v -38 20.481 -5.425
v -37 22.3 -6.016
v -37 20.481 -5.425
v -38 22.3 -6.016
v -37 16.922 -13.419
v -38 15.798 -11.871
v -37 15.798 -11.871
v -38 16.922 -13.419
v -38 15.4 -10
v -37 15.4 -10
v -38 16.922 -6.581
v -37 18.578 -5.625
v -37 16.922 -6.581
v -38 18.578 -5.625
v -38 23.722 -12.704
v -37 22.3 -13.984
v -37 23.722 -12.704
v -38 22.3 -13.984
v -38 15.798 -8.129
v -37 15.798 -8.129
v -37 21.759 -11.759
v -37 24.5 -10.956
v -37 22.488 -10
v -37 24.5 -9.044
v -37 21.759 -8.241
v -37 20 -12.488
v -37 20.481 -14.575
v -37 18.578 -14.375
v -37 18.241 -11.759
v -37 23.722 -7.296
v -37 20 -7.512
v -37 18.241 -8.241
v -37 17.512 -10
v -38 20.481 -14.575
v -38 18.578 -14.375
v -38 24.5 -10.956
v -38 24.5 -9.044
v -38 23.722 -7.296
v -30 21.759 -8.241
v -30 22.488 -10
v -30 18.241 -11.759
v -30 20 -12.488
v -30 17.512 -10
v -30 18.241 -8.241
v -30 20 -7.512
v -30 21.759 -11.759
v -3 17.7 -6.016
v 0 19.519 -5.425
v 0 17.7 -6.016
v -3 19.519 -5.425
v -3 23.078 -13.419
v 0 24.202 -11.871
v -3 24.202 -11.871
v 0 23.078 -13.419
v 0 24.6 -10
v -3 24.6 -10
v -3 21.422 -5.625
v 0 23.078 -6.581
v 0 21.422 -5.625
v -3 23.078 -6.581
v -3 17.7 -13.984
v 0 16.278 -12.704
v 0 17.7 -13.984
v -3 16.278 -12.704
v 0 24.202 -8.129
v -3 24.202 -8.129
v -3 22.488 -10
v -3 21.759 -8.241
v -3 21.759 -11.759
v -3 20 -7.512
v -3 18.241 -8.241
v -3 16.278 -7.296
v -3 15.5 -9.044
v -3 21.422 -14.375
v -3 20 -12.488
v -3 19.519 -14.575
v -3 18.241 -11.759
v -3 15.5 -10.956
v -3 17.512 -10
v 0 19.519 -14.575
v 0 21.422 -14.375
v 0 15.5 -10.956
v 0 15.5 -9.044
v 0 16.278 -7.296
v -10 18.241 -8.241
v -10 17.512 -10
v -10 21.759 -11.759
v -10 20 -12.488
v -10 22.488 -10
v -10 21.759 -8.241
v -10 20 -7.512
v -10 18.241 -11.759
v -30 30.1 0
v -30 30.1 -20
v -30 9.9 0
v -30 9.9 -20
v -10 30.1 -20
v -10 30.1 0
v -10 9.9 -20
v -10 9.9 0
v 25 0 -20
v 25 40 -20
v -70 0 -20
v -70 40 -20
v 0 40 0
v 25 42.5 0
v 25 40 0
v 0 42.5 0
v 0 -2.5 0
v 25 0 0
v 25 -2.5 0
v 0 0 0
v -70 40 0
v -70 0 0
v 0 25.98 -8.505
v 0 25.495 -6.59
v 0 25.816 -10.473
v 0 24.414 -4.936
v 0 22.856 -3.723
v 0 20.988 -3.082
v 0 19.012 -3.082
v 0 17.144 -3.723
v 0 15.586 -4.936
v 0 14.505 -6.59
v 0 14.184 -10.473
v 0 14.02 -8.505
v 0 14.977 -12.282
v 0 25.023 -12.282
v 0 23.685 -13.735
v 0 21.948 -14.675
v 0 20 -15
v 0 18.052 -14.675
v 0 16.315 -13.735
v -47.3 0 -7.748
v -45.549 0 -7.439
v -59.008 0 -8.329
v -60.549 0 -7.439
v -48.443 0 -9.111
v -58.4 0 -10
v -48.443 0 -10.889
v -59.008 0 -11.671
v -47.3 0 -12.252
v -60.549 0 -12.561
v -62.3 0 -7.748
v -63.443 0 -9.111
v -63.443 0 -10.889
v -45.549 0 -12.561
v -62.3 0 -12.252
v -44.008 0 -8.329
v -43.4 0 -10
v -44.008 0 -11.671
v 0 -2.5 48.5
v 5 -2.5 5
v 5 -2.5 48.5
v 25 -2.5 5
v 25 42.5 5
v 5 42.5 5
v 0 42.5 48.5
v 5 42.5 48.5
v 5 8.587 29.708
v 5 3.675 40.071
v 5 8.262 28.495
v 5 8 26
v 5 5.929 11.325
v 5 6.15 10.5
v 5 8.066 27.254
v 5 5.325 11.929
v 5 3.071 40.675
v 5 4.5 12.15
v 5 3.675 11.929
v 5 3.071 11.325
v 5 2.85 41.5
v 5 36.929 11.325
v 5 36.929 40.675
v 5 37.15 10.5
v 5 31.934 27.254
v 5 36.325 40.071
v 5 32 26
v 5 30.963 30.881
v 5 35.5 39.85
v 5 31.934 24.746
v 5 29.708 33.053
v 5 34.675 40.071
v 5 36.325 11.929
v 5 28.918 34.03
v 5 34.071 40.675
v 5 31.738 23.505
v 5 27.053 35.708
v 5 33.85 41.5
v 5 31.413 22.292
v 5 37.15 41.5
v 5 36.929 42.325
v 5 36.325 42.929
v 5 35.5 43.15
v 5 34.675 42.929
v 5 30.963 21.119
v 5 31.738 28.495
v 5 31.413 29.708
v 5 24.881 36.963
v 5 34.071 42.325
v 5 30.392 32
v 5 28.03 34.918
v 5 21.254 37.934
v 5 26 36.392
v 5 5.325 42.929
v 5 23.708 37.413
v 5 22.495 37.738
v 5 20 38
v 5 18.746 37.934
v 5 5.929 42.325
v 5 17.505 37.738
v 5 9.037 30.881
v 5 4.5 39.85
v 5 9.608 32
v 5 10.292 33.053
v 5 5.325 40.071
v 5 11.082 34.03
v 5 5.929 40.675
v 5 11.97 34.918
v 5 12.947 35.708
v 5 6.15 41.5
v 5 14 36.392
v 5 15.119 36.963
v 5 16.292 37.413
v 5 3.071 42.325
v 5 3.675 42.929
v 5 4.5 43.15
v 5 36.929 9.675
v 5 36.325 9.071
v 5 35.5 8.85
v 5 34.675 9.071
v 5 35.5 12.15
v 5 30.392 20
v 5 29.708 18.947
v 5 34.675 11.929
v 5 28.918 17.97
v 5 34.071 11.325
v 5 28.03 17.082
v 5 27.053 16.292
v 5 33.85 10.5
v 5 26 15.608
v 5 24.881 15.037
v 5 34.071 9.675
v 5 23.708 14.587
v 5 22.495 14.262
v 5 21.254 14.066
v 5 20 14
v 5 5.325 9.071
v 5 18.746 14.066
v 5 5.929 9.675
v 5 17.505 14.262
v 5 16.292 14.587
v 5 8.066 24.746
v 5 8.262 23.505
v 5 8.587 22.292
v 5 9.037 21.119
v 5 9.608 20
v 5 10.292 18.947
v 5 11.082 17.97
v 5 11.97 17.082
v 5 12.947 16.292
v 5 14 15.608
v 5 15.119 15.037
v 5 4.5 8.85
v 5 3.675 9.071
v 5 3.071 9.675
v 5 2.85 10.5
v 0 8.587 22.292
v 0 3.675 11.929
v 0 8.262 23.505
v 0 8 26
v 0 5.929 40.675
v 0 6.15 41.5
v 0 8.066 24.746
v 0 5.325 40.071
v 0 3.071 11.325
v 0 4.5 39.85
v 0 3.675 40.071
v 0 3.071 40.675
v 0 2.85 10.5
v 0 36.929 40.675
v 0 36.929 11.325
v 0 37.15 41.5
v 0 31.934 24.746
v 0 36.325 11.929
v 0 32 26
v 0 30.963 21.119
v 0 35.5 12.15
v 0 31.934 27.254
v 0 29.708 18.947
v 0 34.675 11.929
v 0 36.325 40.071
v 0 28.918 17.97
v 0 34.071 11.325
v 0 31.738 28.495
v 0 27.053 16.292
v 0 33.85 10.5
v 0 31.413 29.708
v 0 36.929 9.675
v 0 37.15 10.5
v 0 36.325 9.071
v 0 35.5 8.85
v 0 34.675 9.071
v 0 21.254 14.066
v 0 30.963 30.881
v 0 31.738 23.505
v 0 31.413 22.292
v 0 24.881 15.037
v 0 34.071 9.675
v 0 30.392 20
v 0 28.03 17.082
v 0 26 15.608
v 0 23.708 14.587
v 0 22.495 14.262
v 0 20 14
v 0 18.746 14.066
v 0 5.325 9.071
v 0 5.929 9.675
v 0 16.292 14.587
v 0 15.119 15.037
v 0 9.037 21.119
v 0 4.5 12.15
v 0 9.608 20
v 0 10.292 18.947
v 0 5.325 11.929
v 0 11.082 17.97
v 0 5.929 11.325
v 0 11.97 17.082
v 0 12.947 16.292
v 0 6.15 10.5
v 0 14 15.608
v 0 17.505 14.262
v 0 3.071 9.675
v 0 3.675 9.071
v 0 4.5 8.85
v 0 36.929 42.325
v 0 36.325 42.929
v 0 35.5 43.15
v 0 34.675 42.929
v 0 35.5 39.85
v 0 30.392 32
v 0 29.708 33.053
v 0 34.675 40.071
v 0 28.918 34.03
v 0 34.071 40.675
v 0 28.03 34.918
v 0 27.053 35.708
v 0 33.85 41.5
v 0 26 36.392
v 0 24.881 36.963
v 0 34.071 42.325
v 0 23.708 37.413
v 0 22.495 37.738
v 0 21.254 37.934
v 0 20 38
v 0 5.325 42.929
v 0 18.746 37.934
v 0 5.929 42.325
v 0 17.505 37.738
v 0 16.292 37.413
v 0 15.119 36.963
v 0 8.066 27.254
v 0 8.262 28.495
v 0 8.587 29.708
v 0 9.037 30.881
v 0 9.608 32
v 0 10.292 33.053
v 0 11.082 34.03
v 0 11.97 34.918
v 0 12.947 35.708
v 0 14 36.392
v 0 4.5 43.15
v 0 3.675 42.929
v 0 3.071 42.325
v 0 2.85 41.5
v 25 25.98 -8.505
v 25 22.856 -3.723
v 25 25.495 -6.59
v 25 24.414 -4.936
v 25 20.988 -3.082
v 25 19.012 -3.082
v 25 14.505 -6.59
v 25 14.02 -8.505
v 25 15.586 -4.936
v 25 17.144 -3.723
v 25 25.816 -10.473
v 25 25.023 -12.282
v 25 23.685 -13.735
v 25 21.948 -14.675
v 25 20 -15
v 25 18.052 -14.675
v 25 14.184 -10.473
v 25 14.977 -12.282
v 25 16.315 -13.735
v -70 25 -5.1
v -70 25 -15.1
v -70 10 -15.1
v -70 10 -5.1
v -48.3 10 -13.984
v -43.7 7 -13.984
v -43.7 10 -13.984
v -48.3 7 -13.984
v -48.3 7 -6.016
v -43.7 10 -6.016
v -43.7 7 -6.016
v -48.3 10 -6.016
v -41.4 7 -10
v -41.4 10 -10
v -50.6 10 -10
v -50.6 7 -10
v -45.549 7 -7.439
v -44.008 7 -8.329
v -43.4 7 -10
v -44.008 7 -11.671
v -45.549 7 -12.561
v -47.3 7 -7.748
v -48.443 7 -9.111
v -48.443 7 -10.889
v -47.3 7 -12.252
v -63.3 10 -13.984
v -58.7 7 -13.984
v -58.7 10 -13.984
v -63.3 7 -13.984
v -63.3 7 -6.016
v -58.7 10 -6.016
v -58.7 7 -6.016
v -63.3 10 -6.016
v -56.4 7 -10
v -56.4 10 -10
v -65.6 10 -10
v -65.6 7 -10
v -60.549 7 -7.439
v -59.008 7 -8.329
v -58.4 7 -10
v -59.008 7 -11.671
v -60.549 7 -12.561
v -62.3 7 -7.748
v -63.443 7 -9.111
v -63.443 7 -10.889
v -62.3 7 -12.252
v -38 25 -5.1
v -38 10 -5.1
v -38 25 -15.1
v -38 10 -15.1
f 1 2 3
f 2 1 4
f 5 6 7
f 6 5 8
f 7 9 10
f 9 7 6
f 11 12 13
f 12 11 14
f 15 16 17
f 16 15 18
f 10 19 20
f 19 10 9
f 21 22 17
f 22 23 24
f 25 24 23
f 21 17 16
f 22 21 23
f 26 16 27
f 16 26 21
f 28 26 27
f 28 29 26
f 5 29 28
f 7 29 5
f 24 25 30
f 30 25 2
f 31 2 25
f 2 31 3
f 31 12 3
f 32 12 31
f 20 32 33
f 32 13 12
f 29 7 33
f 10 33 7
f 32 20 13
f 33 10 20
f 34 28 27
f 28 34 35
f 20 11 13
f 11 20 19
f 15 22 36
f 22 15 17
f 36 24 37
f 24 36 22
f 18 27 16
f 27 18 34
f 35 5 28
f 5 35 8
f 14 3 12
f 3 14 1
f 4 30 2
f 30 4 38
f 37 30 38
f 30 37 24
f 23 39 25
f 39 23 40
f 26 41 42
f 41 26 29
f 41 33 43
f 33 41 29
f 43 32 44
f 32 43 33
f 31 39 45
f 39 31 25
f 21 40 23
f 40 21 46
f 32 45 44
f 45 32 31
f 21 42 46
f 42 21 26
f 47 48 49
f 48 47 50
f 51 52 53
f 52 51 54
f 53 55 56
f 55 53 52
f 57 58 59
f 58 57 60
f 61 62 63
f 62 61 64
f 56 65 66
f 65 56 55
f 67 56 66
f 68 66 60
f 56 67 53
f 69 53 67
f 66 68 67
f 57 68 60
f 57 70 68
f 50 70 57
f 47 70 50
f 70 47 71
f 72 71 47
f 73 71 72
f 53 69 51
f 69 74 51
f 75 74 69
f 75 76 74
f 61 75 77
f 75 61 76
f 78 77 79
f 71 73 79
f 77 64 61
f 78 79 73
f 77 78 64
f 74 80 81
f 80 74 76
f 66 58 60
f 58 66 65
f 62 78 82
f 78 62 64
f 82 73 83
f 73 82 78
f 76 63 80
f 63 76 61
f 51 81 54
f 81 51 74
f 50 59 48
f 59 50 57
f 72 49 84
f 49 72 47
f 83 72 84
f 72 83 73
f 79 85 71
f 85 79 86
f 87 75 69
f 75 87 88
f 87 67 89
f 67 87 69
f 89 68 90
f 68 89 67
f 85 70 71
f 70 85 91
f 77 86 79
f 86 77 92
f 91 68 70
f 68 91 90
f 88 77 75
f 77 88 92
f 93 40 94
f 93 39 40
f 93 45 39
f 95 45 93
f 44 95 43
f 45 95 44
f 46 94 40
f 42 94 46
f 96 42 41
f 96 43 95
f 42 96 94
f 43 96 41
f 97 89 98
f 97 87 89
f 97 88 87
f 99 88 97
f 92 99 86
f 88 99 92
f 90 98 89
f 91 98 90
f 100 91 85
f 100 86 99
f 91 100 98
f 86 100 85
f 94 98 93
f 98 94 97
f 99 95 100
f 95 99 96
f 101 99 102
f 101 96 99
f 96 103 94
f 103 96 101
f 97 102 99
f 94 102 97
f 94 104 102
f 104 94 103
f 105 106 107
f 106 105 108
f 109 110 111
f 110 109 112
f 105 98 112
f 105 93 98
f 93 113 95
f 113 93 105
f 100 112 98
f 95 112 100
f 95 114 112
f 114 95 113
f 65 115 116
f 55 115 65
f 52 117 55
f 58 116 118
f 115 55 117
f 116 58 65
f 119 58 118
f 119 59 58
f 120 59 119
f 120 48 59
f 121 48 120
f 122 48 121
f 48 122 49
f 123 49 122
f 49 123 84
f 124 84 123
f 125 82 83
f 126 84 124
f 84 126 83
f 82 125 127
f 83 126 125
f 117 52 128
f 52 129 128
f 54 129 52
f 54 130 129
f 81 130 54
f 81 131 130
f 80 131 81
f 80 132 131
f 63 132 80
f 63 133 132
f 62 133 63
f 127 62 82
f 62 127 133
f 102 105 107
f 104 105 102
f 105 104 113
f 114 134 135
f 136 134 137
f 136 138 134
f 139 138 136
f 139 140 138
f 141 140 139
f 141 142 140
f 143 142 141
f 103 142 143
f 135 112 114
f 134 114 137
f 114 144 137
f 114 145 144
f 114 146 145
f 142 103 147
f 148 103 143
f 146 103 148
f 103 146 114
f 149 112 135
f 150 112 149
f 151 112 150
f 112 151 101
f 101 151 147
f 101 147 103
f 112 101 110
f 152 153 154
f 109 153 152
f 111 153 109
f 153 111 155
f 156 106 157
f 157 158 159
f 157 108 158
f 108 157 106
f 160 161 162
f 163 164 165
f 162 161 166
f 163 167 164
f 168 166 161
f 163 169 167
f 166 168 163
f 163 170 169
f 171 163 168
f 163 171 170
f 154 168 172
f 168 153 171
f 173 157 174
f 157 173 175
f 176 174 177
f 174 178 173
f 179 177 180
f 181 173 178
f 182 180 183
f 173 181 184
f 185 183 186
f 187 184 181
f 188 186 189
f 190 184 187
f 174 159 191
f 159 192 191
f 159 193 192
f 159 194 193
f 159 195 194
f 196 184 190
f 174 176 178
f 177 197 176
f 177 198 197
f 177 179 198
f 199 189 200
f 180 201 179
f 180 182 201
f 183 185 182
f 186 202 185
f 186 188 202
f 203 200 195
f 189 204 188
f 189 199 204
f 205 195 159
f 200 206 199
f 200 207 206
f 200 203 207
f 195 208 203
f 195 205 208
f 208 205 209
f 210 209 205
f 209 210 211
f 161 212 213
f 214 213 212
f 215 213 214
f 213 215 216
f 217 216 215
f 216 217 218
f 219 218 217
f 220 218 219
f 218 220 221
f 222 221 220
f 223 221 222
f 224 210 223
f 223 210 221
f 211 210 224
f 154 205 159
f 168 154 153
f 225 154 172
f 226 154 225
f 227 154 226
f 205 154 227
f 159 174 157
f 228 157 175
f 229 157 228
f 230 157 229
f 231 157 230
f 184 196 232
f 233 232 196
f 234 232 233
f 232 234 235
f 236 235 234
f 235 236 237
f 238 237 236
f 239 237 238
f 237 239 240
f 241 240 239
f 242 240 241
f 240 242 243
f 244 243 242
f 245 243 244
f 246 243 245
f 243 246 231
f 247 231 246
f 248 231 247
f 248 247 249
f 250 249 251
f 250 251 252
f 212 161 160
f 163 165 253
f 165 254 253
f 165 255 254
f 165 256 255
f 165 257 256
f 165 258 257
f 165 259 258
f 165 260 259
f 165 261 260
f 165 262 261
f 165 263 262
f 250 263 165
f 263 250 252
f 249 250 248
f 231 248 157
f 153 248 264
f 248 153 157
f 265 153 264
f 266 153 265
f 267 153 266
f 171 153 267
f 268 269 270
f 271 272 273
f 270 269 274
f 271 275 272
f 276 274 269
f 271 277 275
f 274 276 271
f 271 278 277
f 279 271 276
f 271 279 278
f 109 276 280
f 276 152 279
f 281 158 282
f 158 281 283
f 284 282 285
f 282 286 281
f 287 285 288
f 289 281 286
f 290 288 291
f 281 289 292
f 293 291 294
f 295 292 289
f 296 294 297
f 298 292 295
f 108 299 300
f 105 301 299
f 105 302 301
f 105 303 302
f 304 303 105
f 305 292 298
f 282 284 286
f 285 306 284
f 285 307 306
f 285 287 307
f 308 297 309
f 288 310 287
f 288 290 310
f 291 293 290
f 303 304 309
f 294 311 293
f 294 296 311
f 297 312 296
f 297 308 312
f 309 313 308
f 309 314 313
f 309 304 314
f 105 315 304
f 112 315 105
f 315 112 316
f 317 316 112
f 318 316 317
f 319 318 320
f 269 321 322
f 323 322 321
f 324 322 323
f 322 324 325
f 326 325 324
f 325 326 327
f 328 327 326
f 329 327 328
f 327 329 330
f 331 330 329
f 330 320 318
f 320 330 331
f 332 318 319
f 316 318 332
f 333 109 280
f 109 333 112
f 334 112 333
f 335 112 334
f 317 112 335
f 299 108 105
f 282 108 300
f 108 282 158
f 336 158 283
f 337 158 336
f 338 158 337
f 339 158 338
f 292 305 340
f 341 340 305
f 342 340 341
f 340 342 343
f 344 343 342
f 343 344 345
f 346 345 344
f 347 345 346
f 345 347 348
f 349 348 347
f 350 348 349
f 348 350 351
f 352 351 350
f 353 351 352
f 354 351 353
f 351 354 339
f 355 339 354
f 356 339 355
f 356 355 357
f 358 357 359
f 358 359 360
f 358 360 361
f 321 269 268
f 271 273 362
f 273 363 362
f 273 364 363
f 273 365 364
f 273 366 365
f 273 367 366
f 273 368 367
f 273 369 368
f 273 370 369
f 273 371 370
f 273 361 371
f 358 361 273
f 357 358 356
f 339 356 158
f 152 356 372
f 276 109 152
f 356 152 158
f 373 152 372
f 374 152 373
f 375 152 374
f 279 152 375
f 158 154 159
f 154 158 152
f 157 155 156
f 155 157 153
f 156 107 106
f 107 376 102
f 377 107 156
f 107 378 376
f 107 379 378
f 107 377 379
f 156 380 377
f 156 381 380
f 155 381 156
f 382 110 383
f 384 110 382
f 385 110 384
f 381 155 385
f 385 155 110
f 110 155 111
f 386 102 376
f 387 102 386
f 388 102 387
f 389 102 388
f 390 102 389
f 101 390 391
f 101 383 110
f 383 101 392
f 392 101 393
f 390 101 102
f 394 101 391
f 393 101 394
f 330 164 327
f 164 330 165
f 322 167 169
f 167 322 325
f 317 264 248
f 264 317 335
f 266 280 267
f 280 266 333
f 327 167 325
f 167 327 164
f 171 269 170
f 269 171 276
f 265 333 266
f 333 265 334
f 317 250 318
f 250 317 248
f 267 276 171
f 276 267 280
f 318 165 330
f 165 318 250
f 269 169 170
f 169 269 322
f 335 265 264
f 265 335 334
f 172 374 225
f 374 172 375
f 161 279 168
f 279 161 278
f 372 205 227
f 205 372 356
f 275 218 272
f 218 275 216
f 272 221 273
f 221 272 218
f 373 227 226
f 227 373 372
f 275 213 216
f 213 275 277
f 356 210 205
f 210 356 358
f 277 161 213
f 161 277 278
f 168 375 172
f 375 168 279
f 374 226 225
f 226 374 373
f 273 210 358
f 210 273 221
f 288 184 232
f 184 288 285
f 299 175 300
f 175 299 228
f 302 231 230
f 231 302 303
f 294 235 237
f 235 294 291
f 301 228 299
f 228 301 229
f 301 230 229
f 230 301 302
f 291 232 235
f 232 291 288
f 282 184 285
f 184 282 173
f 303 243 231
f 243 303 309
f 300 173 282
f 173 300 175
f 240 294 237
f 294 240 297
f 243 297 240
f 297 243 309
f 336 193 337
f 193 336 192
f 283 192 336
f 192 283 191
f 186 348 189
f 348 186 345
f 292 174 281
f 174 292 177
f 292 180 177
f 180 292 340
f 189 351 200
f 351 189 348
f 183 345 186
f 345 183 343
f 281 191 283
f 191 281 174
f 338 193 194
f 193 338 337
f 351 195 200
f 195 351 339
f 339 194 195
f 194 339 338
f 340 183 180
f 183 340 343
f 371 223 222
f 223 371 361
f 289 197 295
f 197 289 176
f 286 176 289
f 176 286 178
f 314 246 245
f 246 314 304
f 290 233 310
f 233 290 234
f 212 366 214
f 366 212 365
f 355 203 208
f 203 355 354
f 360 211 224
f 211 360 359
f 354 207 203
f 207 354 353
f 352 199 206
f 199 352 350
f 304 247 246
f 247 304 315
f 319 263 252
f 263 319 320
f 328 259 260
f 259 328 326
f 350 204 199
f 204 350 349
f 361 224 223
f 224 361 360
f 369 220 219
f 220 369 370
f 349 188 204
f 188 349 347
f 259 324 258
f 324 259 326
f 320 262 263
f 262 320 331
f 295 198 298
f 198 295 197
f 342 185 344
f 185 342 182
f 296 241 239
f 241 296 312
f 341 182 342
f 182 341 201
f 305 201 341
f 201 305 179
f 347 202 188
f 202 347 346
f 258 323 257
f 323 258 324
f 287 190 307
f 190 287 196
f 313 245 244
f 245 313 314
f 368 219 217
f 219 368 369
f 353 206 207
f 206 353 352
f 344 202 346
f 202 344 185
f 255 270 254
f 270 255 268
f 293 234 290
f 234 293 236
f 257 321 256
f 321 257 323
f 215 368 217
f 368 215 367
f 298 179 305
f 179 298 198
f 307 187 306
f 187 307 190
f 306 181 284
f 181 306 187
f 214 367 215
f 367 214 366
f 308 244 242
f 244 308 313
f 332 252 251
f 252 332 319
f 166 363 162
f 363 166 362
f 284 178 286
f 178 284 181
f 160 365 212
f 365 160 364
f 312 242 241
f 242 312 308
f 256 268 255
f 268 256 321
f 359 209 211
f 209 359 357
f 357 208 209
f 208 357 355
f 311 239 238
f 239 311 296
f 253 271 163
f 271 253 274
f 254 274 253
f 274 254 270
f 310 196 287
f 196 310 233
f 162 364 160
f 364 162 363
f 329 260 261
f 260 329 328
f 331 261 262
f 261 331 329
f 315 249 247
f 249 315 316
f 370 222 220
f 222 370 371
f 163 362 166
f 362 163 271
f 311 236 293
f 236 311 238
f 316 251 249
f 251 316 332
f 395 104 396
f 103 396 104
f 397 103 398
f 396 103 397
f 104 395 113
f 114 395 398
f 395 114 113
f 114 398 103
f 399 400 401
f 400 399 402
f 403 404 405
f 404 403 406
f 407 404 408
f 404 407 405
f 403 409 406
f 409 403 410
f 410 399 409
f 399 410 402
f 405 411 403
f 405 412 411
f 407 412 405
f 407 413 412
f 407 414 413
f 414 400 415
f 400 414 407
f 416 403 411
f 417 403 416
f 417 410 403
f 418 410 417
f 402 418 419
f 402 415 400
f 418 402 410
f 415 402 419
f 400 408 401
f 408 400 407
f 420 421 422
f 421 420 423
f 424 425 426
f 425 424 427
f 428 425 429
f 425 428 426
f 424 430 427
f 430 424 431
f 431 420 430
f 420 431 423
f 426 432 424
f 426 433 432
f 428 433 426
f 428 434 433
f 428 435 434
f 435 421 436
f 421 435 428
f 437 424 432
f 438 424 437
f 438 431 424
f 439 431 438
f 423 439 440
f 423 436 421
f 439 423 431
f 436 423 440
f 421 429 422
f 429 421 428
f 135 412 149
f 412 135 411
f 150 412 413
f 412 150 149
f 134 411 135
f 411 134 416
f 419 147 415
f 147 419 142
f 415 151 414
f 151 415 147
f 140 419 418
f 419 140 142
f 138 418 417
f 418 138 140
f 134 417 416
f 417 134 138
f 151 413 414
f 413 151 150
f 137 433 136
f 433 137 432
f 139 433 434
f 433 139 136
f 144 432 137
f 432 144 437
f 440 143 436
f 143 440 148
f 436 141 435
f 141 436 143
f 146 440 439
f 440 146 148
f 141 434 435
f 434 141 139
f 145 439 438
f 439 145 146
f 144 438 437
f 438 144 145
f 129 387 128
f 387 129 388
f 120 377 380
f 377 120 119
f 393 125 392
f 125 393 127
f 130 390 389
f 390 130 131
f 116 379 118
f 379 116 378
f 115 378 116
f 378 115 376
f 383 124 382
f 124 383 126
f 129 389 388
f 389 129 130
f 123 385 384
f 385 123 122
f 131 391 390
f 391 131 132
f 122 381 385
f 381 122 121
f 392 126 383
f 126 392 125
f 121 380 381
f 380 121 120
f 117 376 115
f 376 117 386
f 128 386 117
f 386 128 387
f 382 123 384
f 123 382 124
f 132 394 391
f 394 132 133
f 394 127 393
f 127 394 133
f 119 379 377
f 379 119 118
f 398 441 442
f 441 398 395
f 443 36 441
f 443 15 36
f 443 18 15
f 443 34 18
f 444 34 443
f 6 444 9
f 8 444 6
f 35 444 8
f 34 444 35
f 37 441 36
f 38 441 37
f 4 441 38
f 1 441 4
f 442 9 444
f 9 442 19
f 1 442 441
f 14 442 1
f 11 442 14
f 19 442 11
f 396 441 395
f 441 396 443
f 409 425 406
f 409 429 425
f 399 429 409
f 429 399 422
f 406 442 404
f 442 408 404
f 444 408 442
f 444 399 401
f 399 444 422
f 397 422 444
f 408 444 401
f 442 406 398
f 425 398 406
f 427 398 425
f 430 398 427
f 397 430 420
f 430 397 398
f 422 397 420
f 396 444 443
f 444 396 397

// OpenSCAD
// file: MCAD/constants.scad
// MIT license


TAU = 6.2831853071; //2*PI, see http://tauday.com/
PI = TAU/2;

// translates a imperial measurement in inches to meters
mm_per_inch = 25.4;
// file: MCAD/math.scad
// MIT license

include <constants.scad>

function deg(angle) = 360*angle/TAU;
// file: bom.scad
module bom(code, desc, category) {
	echo(str("BOM: ",code," - ", desc, "; ", category));
}
// file: MCAD/shapes.scad
/*
 *  OpenSCAD Shapes Library (www.openscad.org)
 *  Copyright (C) 2009  Catarina Mota
 *  Copyright (C) 2010  Elmo Mäntynen
 *
 *  License: LGPL 2.1 or later
*/

// 2D Shapes
//ngon(sides, radius, center=false);

// 3D Shapes
//box(width, height, depth);
//roundedBox(width, height, depth, factor);
//cone(height, radius);
//ellipticalCylinder(width, height, depth);
//ellipsoid(width, height);
//tube(height, radius, wall, center = false);
//tube2(height, ID, OD, center = false);
//ovalTube(width, height, depth, wall, center = false);
//hexagon(height, depth);
//octagon(height, depth);
//dodecagon(height, depth);
//hexagram(height, depth);
//rightTriangle(adjacent, opposite, depth);
//equiTriangle(side, depth);
//12ptStar(height, depth);

//----------------------

// size is a vector [w, h, d]
module box(width, height, depth) {
  cube([width, height, depth], true);
}

// size is a vector [w, h, d]
module roundedBox(width, height, depth, radius) {
  size=[width, height, depth];
  cube(size - [2*radius,0,0], true);
  cube(size - [0,2*radius,0], true);
  for (x = [radius-size[0]/2, -radius+size[0]/2],
       y = [radius-size[1]/2, -radius+size[1]/2]) {
    translate([x,y,0]) cylinder(r=radius, h=size[2], center=true);
  }
}

module cone(height, radius, center = false) {
  cylinder(height, radius, 0, center);
}

module ellipticalCylinder(w,h, height, center = false) {
  scale([1, h/w, 1]) cylinder(h=height, r=w, center=center);
}

module ellipsoid(w, h, center = false) {
  scale([1, h/w, 1]) sphere(r=w/2, center=center);
}

// wall is wall thickness
module tube(height, radius, wall, center = false) {
  difference() {
    cylinder(h=height, r=radius, center=center);
    cylinder(h=height, r=radius-wall, center=center);
  }
}

// wall is wall thickness
module tube2(height, ID, OD, center = false) {
  difference() {
    cylinder(h=height, r=OD/2, center=center);
    cylinder(h=height, r=ID/2, center=center);
  }
}

// wall is wall thickness
module ovalTube(height, rx, ry, wall, center = false) {
  difference() {
    scale([1, ry/rx, 1]) cylinder(h=height, r=rx, center=center);
    scale([(rx-wall)/rx, (ry-wall)/rx, 1]) cylinder(h=height, r=rx, center=center);
  }
}

// size is the XY plane size, height in Z
module hexagon(size, height) {
  boxWidth = size/1.75;
  for (r = [-60, 0, 60]) rotate([0,0,r]) cube([boxWidth, size, height], true);
}

// size is the XY plane size, height in Z
module octagon(size, height) {
  intersection() {
    cube([size, size, height], true);
    rotate([0,0,45]) cube([size, size, height], true);
  }
}

// size is the XY plane size, height in Z
module dodecagon(size, height) {
  intersection() {
    hexagon(size, height);
    rotate([0,0,90]) hexagon(size, height);
  }
}

// size is the XY plane size, height in Z
module hexagram(size, height) {
  boxWidth=size/1.75;
  for (v = [[0,1],[0,-1],[1,-1]]) {
    intersection() {
      rotate([0,0,60*v[0]]) cube([size, boxWidth, height], true);
      rotate([0,0,60*v[1]]) cube([size, boxWidth, height], true);
    }
  }
}

module rightTriangle(adjacent, opposite, height) {
  difference() {
    translate([-adjacent/2,opposite/2,0]) cube([adjacent, opposite, height], true);
    translate([-adjacent,0,0]) {
      rotate([0,0,atan(opposite/adjacent)]) dislocateBox(adjacent*2, opposite, height+2);
    }
  }
}

module equiTriangle(side, height) {
  difference() {
    translate([-side/2,side/2,0]) cube([side, side, height], true);
    rotate([0,0,30]) dislocateBox(side*2, side, height);
    translate([-side,0,0]) {
      rotate([0,0,60]) dislocateBox(side*2, side, height);
    }
  }
}

module 12ptStar(size, height) {
  starNum = 3;
  starAngle = 360/starNum;
  for (s = [1:starNum]) {
    rotate([0, 0, s*starAngle]) cube([size, size, height], true);
  }
}

//-----------------------
//MOVES THE ROTATION AXIS OF A BOX FROM ITS CENTER TO THE BOTTOM LEFT CORNER
module dislocateBox(w, h, d) {
  translate([0,0,-d/2]) cube([w,h,d]);
}

//-----------------------
// Tests
//module test2D_ellipse(){ellipse(10, 5);}
module test_ellipsoid(){ellipsoid(10, 5);}

//module test2D_egg_outline(){egg_outline();}
// file: MCAD/motors.scad
// Copyright 2010 D1plo1d

// This library is dual licensed under the GPL 3.0 and the GNU Lesser General Public License as per http://creativecommons.org/licenses/LGPL/2.1/ .

include <math.scad>


//generates a motor mount for the specified nema standard #.
module stepper_motor_mount(nema_standard,slide_distance=0, mochup=true, tolerance=0) {
	//dimensions from:
	// http://www.numberfactory.com/NEMA%20Motor%20Dimensions.htm
	if (nema_standard == 17)
	{
		_stepper_motor_mount(
			motor_shaft_diameter = 0.1968*mm_per_inch,
			motor_shaft_length = 0.945*mm_per_inch,
			pilot_diameter = 0.866*mm_per_inch,
			pilot_length = 0.80*mm_per_inch,
			mounting_bolt_circle = 1.725*mm_per_inch,
			bolt_hole_size = 3.5,
			bolt_hole_distance = 1.220*mm_per_inch,
			slide_distance = slide_distance,
			mochup = mochup,
			tolerance=tolerance);
	}
	if (nema_standard == 23)
	{
		_stepper_motor_mount(
			motor_shaft_diameter = 0.250*mm_per_inch,
			motor_shaft_length = 0.81*mm_per_inch,
			pilot_diameter = 1.500*mm_per_inch,
			pilot_length = 0.062*mm_per_inch,
			mounting_bolt_circle = 2.625*mm_per_inch,
			bolt_hole_size = 0.195*mm_per_inch,
			bolt_hole_distance = 1.856*mm_per_inch,
			slide_distance = slide_distance,
			mochup = mochup,
			tolerance=tolerance);
	}
	
}


//inner mehod for creating a stepper motor mount of any dimensions
module _stepper_motor_mount(
	motor_shaft_diameter,
	motor_shaft_length,
	pilot_diameter,
	pilot_length,
	mounting_bolt_circle,
	bolt_hole_size,
	bolt_hole_distance,
	slide_distance = 0,
	motor_length = 40, //arbitray - not standardized
	mochup,
	tolerance = 0
)
{
	union()
	{
	// == centered mount points ==
	//mounting circle inset
	translate([0,slide_distance/2,0]) circle(r = pilot_diameter/2 + tolerance);
	square([pilot_diameter,slide_distance],center=true);
	translate([0,-slide_distance/2,0]) circle(r = pilot_diameter/2 + tolerance);

	//todo: motor shaft hole
	
	//mounting screw holes
	for (x = [-1,1])
	{
		for (y = [-1,1])
		{
			translate([x*bolt_hole_distance/2,y*bolt_hole_distance/2,0])
			{
				translate([0,slide_distance/2,0]) circle(bolt_hole_size/2 + tolerance);
				translate([0,-slide_distance/2,0]) circle(bolt_hole_size/2 + tolerance);
				square([bolt_hole_size+2*tolerance,slide_distance],center=true);
			}
		}
	}
	// == motor mock-up ==
	//motor box
	if (mochup == true)
	{
		%translate([0,0,-5]) cylinder(h = 5, r = pilot_diameter/2);
		%translate(v=[0,0,-motor_length/2])
		{
			cube(size=[bolt_hole_distance+bolt_hole_size+5,bolt_hole_distance+bolt_hole_size+5,motor_length], center = true);
		}
		//shaft
		%translate(v=[0,0,-(motor_length-motor_shaft_length-2)/2])
		{
			%cylinder(r=motor_shaft_diameter/2,h=motor_length+motor_shaft_length--1, center = true);
		}
	}
	}
}
// file: MCAD/materials.scad
/*
 * Material colors.
 * 
 * Originally by Hans Häggström, 2010.
 * Dual licenced under Creative Commons Attribution-Share Alike 3.0 and LGPL2 or later
 */

// Material colors
Oak = [0.65, 0.5, 0.4];
Pine = [0.85, 0.7, 0.45];
Birch = [0.9, 0.8, 0.6];
FiberBoard = [0.7, 0.67, 0.6];
BlackPaint = [0.2, 0.2, 0.2];
Iron = [0.36, 0.33, 0.33];
Steel = [0.65, 0.67, 0.72];
Stainless = [0.45, 0.43, 0.5];
Aluminum = [0.77, 0.77, 0.8];
Brass = [0.88, 0.78, 0.5];
Transparent = [1, 1, 1, 0.2];

// Example, uncomment to view
//color_demo();

module color_demo(){
    // Wood
    colorTest(Oak, 0, 0);
    colorTest(Pine, 1, 0);
    colorTest(Birch, 2, 0);

    // Metals
    colorTest(Iron, 0, 1);
    colorTest(Steel, 1, 1);
    colorTest(Stainless, 2, 1);
    colorTest(Aluminum, 3, 1);

    // Mixboards
    colorTest(FiberBoard, 0, 2);

    // Paints
    colorTest(BlackPaint, 0, 3);
}

module colorTest(col, row=0, c=0) {
  color(col) translate([row * 30,c*30,0]) sphere(r=10);
}
// file: MCAD/units.scad
/*
 * Basic units.
 * 
 * Originally by Hans Häggström, 2010.
 * Dual licenced under Creative Commons Attribution-Share Alike 3.0 and LGPL2 or later
 */


mm = 1;
cm = 10 * mm;
dm = 100 * mm;
m = 1000 * mm;

inch = 25.4 * mm;

X = [1, 0, 0];
Y = [0, 1, 0];
Z = [0, 0, 1];

M3 = 3*mm;
M4 = 4*mm;
M5 = 5*mm;
M6 = 6*mm;
M8 = 8*mm;


// When a small distance is needed to overlap shapes for boolean cutting, etc.
epsilon = 0.01*mm;
// file: vslot.scad
include <MCAD/units.scad>;
include <MCAD/materials.scad>
use <MCAD/shapes.scad>;
use <bom.scad>;

vslot_color_black = [0.27, 0.27, 0.3];
vslot_color = Aluminum;

module vslot(length=50, sections=1, finish, cutout=0) {
	size = sections * 20;
	bom(str("vslot20x", size, "x", length), str("v-slot 20x", size, " (", length , "mm)"), ["rail", "extrusion", "structure"]);
	cutext = [[12.00,4.50],[10.00,4.50],[8.20,2.78],[8.20,5.50],[6.56,5.50],[3.90,2.84],[3.90,0.21],[3.69,0.00],[3.90,-0.21],[3.90,-2.84],[6.56,-5.50],[8.20,-5.50],[8.20,-2.78],[10.00,-4.50],[12.00,-4.50]];
	cutint = [[16.10,0.21],[16.10,2.84],[12.70,6.24],[12.70,8.78],[7.30,8.78],[7.30,6.24],[3.90,2.84],[3.90,0.21],[3.69,0.00],[3.90,-0.21],[3.90,-2.84],[7.30,-6.24],[7.30,-8.78],[12.70,-8.78],[12.70,-6.24],[16.10,-2.84],[16.10,-0.21],[16.31,0.00],];
	cutcorner = [[8.20,8.20],[6.57,8.20],[6.57,7.66],[7.66,6.57],[8.20,6.57]];

	module profile() {
        
		difference() {
         
			translate([0,0,length/2])
			roundedBox(20 * sections, 20, length, 1.5);
         if (cutout == 0){
			for(i = [0,180]) rotate([0,0,-i]) translate([10 * (sections - 1), 0, -epsilon/2]) {
				linear_extrude(length+20) polygon(cutext);
				translate([5,-2.89,-20]) cube([10,5.78,length+40]);
			}
          
			for(i = [90,270]) rotate([0,0,-i])
				for(j = [0:sections-1]) translate([0, (sections - 1) * 10 - 20 * j, -epsilon/2]) {
					linear_extrude(length+epsilon) polygon(cutext);
					translate([5,-2.89,-20]) cube([10,5.78,length+40]);
				}

			for(i = [0:sections-1]) translate([i * 20 - 10 * (sections - 1),0,-epsilon/2])
				cylinder(length+20, 2.1, 2.1);

			for(i = [90,270]) rotate([0,0,-i])
				translate([0,(sections - 1) * 10,-epsilon/2])
				linear_extrude(length+epsilon) polygon(cutcorner);
			for(i = [ 0,180]) rotate([0,0,-i])
				translate([(sections - 1) * 10,0,-epsilon/2])
				linear_extrude(length+epsilon) polygon(cutcorner);

			if(sections > 1)
				for(i = [0:sections-2]) translate([(sections - 3) * 10 - i * 20, 0, -epsilon/2])
					linear_extrude(length+epsilon) polygon(cutint);
                      }
		}
	}

      if (cutout == 1){
		 translate([0,0,length/2]) box(20 * sections, 20.2, length);
          } else {
	     if(finish)
		   color(finish) profile();
	     else
		   color(vslot_color) profile();
         }
}

module vslot20x20(length, finish) { vslot(length, 1, finish); }
module vslot20x20_cutout(length, finish) { vslot(length, 1, finish, 1); }


module vslot20x40(length, finish) { vslot(length, 2, finish); }
module vslot20x40_cutout(length, finish) { vslot(length, 2, finish, 1); }

module vslot20x60(length, finish) { vslot(length, 3, finish); }
module vslot20x60_cutout(length, finish) { vslot(length, 3, finish, 1); }

module vslot20x80(length, finish) { vslot(length, 4, finish); }
module vslot20x80_cutout(length, finish) { vslot(length, 4, finish, 1); }


module vslot_test() {
	$fn = 32;

	vslot20x20(100);

	translate([0, 40, 0])
	vslot20x40(100, vslot_color_black);

	translate([0, 80, 0])
	vslot20x60(100);

	translate([0, 120, 0])
	vslot20x80(100, vslot_color_black);

    translate([0,140,0]) vslot20x20_cutout(100);
}

vslot_test();
// file: spacer.scad
use <mountblock.scad>;
use <nemamount.scad>;
use <MCAD/nuts_and_bolts.scad>;

module spacerblock()
{
   // %translate([18,-5,-2]) rotate([0,180,0]) boltHole(5, length=20);
   // %translate([48,-5,-2]) rotate([0,180,0]) boltHole(5, length=20);
   // %translate([33,-5,-17]) rotate([0,0,0]) boltHole(5,length=30);
   // %translate([33,-5,-21]) nutHole(5);
	difference(){
        translate([60,5,-20]) rotate([180,180,0]) cube([52,20,21]);
        translate([18,-5,-2]) rotate([0,180,0]) boltHole(5, length=20);
        translate([48,-5,-2]) rotate([0,180,0]) boltHole(5, length=20);
        translate([33,-5,-2]) rotate([0,180,0]) boltHole(5, length=20);
        translate([48,-105,-2]) nutHole(5);
        translate([33,-5,-17]) rotate([0,180,0]) cylinder(r=3,length=30);
        translate([33,-5,-21]) nutHole(5);
        }
}

spacerblock();
// file: zcorner.scad
use <mountblock.scad>;
use <nemamount.scad>;
use <MCAD/nuts_and_bolts.scad>;

module zmotor_body()
{
    translate([0,0,0]) rotate([0,180,0]) mountblock();
	translate([-40,-2,39]) rotate([0,90,90]) nema_geared_motor();
    translate([-70,-10,-20]) cube([31,60,20]);
    translate([-41,-10,-20]) cube([41,10,20]);
    translate([-41,40,-20]) cube([41,10,20]);
    translate([0,-10,-20]) cube([31,60,20]);
    %translate([-46,41,-10]) rotate([90,0,0]) nutHole(5);
    
   // %translate([-38,20,-10.1]) rotate([0,90,180]) cylinder(r=6,h=33);
    
    %translate([20,40,-1]) rotate([0,180,0]) boltHole(5,length=30);
    %translate([ 0,40,-1]) rotate([0,180,0]) boltHole(5,length=30);
    %translate([-4,0,-1]) rotate([0,180,0]) boltHole(5,length=50);
   // %translate([-1,20,-9.1]) rotate([0,90,0]) cylinder(r=6,h=34);
}

module zmotor_cuts()
{
    translate([-46,41,-10]) rotate([90,0,0]) nutHole(5);
    translate([-61,41,-10]) rotate([90,0,0]) nutHole(5);
    translate([20,40,-1]) rotate([0,180,0]) boltHole(5,length=30);
    translate([ 0,40,-1]) rotate([0,180,0]) boltHole(5,length=30);
    translate([-38,20,-10.1]) rotate([0,90,180]) cylinder(r=6,h=34);
    translate([-1,20,-9.1]) rotate([0,90,0]) cylinder(r=6,h=50);
    translate([-4,0,-1]) rotate([0,180,0]) boltHole(5,length=50);
}





module zmotor()
{
   difference(){
       zmotor_body();
       zmotor_cuts();
       }
}


zmotor();
// file: xcorner.scad
use <mountblock.scad>;
use <nemamount.scad>;
use <MCAD/nuts_and_bolts.scad>;

module xmotor_body()
{
	translate([0,0,0]) rotate([0,180,0]) mountblock();
	translate([0,20,25]) rotate([0,0,90]) nema_motor();
    translate([0,0,-20]) cube([25,40,20]);
    %translate([20,20,-10]) rotate([0,90,0]) cylinder(r=6,h=45.2);
    translate([0,40,0]) rotate([0,180,0])cube([50,10,20]);
    translate([-40,0,0]) rotate([0,180,0])cube([10,40,20]);
    %translate([-25,40,-3]) rotate([0,180,270]) boltHole(5, length=20);
    %translate([-40,40,-3]) rotate([0,180,270]) boltHole(5, length=20);

   
    
}

module xmotor_cuts()
{
     translate([0,20,-10.1]) rotate([0,90,0]) cylinder(r=6,h=26.2);
     translate([0,20,-10.1]) rotate([0,90,0]) cylinder(r=6,h=26.2);
     translate([-65,20,-10.1]) rotate([0,90,0]) cylinder(r=6,h=26.2);
     translate([-25,40,0]) rotate([0,180,270]) cylinder(r=6, h=5);
     translate([-40,40,0]) rotate([0,180,270]) cylinder(r=6, h=5);
     translate([-25,40,-9]) rotate([0,180,270]) boltHole(5, length=12);
     translate([-40,40,-9]) rotate([0,180,270]) boltHole(5, length=12);
     
}

module xmotor()
{
	difference(){
       xmotor_body();
       xmotor_cuts();
       }

}

xmotor();
// file: MCAD/nuts_and_bolts.scad
// Copyright 2010 D1plo1d

// This library is dual licensed under the GPL 3.0 and the GNU Lesser General Public License as per http://creativecommons.org/licenses/LGPL/2.1/ .

//testNutsAndBolts();

module SKIPtestNutsAndBolts()
{
	$fn = 360;
	translate([0,15])nutHole(3, proj=2);
	boltHole(3, length= 30, proj=2);
}

MM = "mm";
INCH = "inch"; //Not yet supported

//Based on: http://www.roymech.co.uk/Useful_Tables/Screws/Hex_Screws.htm
METRIC_NUT_AC_WIDTHS =
[
	-1, //0 index is not used but reduces computation
	-1,
	-1,
	6.40,//m3
	8.10,//m4
	9.20,//m5
	11.50,//m6
	-1,
	15.00,//m8
	-1,
	19.60,//m10
	-1,
	22.10,//m12
	-1,
	-1,
	-1,
	27.70,//m16
	-1,
	-1,
	-1,
	34.60,//m20
	-1,
	-1,
	-1,
	41.60,//m24
	-1,
	-1,
	-1,
	-1,
	-1,
	53.1,//m30
	-1,
	-1,
	-1,
	-1,
	-1,
	63.5//m36
];
METRIC_NUT_THICKNESS =
[
	-1, //0 index is not used but reduces computation
	-1,
	-1,
	2.40,//m3
	3.20,//m4
	4.00,//m5
	5.00,//m6
	-1,
	6.50,//m8
	-1,
	8.00,//m10
	-1,
	10.00,//m12
	-1,
	-1,
	-1,
	13.00,//m16
	-1,
	-1,
	-1,
	16.00//m20
	-1,
	-1,
	-1,
	19.00,//m24
	-1,
	-1,
	-1,
	-1,
	-1,
	24.00,//m30
	-1,
	-1,
	-1,
	-1,
	-1,
	29.00//m36
];

COURSE_METRIC_BOLT_MAJOR_THREAD_DIAMETERS =
[//based on max values
	-1, //0 index is not used but reduces computation
	-1,
	-1,
	2.98,//m3
	3.978,//m4
	4.976,//m5
	5.974,//m6
	-1,
	7.972,//m8
	-1,
	9.968,//m10
	-1,
	11.966,//m12
	-1,
	-1,
	-1,
	15.962,//m16
	-1,
	-1,
	-1,
	19.958,//m20
	-1,
	-1,
	-1,
	23.952,//m24
	-1,
	-1,
	-1,
	-1,
	-1,
	29.947,//m30
	-1,
	-1,
	-1,
	-1,
	-1,
	35.940//m36
];

module nutHole(size, units=MM, tolerance = +0.0001, proj = -1)
{
	//takes a metric screw/nut size and looksup nut dimensions
	radius = METRIC_NUT_AC_WIDTHS[size]/2+tolerance;
	height = METRIC_NUT_THICKNESS[size]+tolerance;
	if (proj == -1)
	{
		cylinder(r= radius, h=height, $fn = 6, center=[0,0]);
	}
	if (proj == 1)
	{
		circle(r= radius, $fn = 6);
	}
	if (proj == 2)
	{
		translate([-radius/2, 0])
			square([radius*2, height]);
	}
}

module boltHole(size, units=MM, length, tolerance = +0.0001, proj = -1)
{
	radius = COURSE_METRIC_BOLT_MAJOR_THREAD_DIAMETERS[size]/2+tolerance;
//TODO: proper screw cap values
	capHeight = METRIC_NUT_THICKNESS[size]+tolerance; //METRIC_BOLT_CAP_HEIGHTS[size]+tolerance;
	capRadius = METRIC_NUT_AC_WIDTHS[size]/2+tolerance; //METRIC_BOLT_CAP_RADIUS[size]+tolerance;

	if (proj == -1)
	{
	translate([0, 0, -capHeight])
		cylinder(r= capRadius, h=capHeight);
	cylinder(r = radius, h = length);
	}
	if (proj == 1)
	{
		circle(r = radius);
	}
	if (proj == 2)
	{
		translate([-capRadius/2, -capHeight])
			square([capRadius*2, capHeight]);
		square([radius*2, length]);
	}
}
// file: nemamount.scad
include <MCAD/units.scad>;
include <MCAD/materials.scad>
include <MCAD/stepper.scad>
include <MCAD/motors.scad>
use <MCAD/shapes.scad>;
$fn = 32;




module motor_support(ht)
{
   difference(){
	  translate([-22.5,23.5,0]) rotate([90,0,0]) motor_support_body(ht);
      translate([0,1,0]) rotate([90,0,0]) motor_support_cuts(ht);
      }
}

module motor_support_body(ht)
{
	cube([45,ht,48.5]);

}


module motor_support_cuts(ht)
{
// Motor shaft/pulley cutout.
      translate([0,.1,0]) rotate([90, 0, 0]) cylinder(r=12, h=ht*2, center=true, $fn=60);
      // NEMA 17 stepper motor mounting screws.
      for (x = [-1, 1]) for (z = [-1, 1]) {
        scale([x, 1, z]) translate([15.5, .1, 15.5]) {
          rotate([90, 0, 0]) cylinder(r=4, h=ht*2, center=true, $fn=12);
          }
        }
}



module nema_geared_cutout()
{
    //pulley opening
    translate([16,1,21]) rotate([90,0,0]){
      cylinder (h=22, r=6.6);

      rotate([0,0,45]) {
        translate([14,0,0]) cylinder(h=22, r=1.6, $fn=12);
        translate([0,14,0]) cylinder(h=22, r=1.6, $fn=12);
        translate([-14,0,0]) cylinder(h=22, r=1.6, $fn=12);
        translate([0,-14,0]) cylinder(h=22, r=1.6, $fn=12);
      }
     
    }

    //gearhead indentation
    translate([16,-5,21]) rotate([90,0,0]) cylinder (h=3.35, r=11.25);

  
    
}

module nema_cutout()
{
// Motor shaft/pulley cutout.
      rotate([90, 0, 0]) cylinder(r=12, h=20, center=true, $fn=60);
      // NEMA 17 stepper motor mounting screws.
      for (x = [-1, 1]) for (z = [-1, 1]) {
        scale([x, 1, z]) translate([15.5, -5, 15.5]) {
          rotate([90, 0, 0]) cylinder(r=1.65, h=20, center=true, $fn=12);
          }
        }
}

module nema_motor()
{
   union(){
     nema_mount();
     %translate([0,-4,1]) rotate([90,0,0]) motor(Nema17, size=NemaLong , dualAxis=false);
     }
}

module nema_motor_inverse()
{
   union(){
     nema_mount_inverse();
     %translate([0,-4,1]) rotate([90,0,0]) motor(Nema17, size=NemaLong , dualAxis=false);
     }
}

module nema_geared_motor_inverse()
{
   union(){
     nema_geared_inverse();
     %translate([16,-7,22]) rotate([90,0,180]) motor(Nema17, NemaLong, dualAxis=false);
    
     }
}

module nema_geared_motor()
{
   union(){
     nema_geared_mount();
     %translate([16,-7,22]) rotate([90,0,180]) motor(Nema17, NemaLong, dualAxis=false);
    
     }
}

module nema_geared_mount()
{
   difference(){
      union(){
           translate([-6,-6,0]) rotate([90,0,0]) cube([45,45,7]);
           translate([-6,-13,-4]) rotate([0,0,0]) cube([45,25,5]);
           translate([-6,-13,44]) rotate([0,0,0]) cube([45,25,5]);
           }
      translate([0,0,1]) nema_geared_cutout();
      }


}

module nema_geared_inverse()
{
   difference(){
      union(){
           translate([-6,-6,0]) rotate([90,0,0]) cube([45,45,7]);
           translate([-6,-31,-4]) rotate([0,0,0]) cube([45,25,5]);
           translate([-6,-31,44]) rotate([0,0,0]) cube([45,25,5]);
           }
      translate([0,0,1]) nema_geared_cutout();
      }


}

module nema_mount_inverse()
{
   difference(){
      union(){
        translate([-22.5,0,-21.5]) rotate([90,0,0]) cube([45,45,5]);
        translate([-22.5,-5,-25]) rotate([0,0,0]) cube([45,25,5]);
        }
      translate([0,0,1]) nema_cutout();
      }
   //nema_cutout();
}

module nema_mount()
{
   difference(){
      union(){
        translate([-22.5,0,-21.5]) rotate([90,0,0]) cube([45,45,5]);
        translate([-22.5,-25,-25]) rotate([0,0,0]) cube([45,25,5]);
        }
      translate([0,0,1]) nema_cutout();
      }
   //nema_cutout();
}

//nema_motor_inverse();
translate([0,0,40]) rotate([270,0,0]) nema_motor();
translate([0,0,0]) motor_support(40);
//nema_geared_motor();
//nema_geared_motor_inverse();
// file: mountblock.scad
use <vslot.scad>;
use <MCAD/nuts_and_bolts.scad>;


module mountblock_body()
{
	cube([40,40,20]);
	translate([20,20,0]) %vslot20x20(200);
     %translate([37,20,10]) rotate([90,0,270]) boltHole(5, length=18);
     %translate([3,20,10]) rotate([90,0,90]) boltHole(5, length=18);
}


module mountblock_cuts()
{
	translate([20,20,-0.2]) vslot20x20_cutout(80.1);
    translate([37,20,10]) rotate([90,0,270]) boltHole(5, length=18);
    translate([3,20,10]) rotate([90,0,90]) boltHole(5, length=18);
}


module mountblock()
{
	difference(){
         mountblock_body();
         mountblock_cuts();
         }

}


mountblock();
// file: cornerparts.scad
use <xcorner.scad>;
use <ycorner.scad>;
use <zcorner.scad>;
use <spacer.scad>;









rotate([0,90,180]) xmotor();
translate([20,-50,-21]) rotate([90,90,0]) ymotor();
translate([51,20,50]) rotate([0,0,180]) zmotor();
translate([22,25,29]) spacerblock();
// main file
use <cornerparts.scad>
use <mountblock.scad>;
use <nemamount.scad>;
use <MCAD/nuts_and_bolts.scad>;

module ymotor_body()
{
    translate([0,0,0]) rotate([0,180,0]) mountblock();
	translate([0,20,25]) rotate([0,0,90]) nema_motor();
    translate([0,0,-20]) cube([25,40,20]);
    translate([-70,0,-20]) cube([31,40,20]);
    %translate([0,20,-10.1]) rotate([0,90,0]) cylinder(r=6,h=26.2);
    %translate([-46,11,-10]) rotate([90,0,0]) nutHole(5);
    %translate([-61,11,-10]) rotate([90,0,0]) nutHole(5);
	//%translate([-38,20,-10.1]) rotate([0,90,180]) cylinder(r=6,h=33);

    
}

module ymotor_cuts()
{
    translate([-46,11,-10]) rotate([90,0,0]) nutHole(5);
    translate([-61,11,-10]) rotate([90,0,0]) nutHole(5);
    translate([-46,11,-10]) rotate([90,0,0]) cylinder(r=2.6,h=20);
    translate([-61,11,-10]) rotate([90,0,0]) cylinder(r=2.6,h=20);

    translate([0,20,-9]) rotate([0,90,0]) cylinder(r=6,h=35);

     translate([-38,25,-5.1]) rotate([0,90,180]) cube([10,15,35]); 
}

module ymotor()
{
   difference(){
       ymotor_body();
       ymotor_cuts();
       }


}


ymotor();
